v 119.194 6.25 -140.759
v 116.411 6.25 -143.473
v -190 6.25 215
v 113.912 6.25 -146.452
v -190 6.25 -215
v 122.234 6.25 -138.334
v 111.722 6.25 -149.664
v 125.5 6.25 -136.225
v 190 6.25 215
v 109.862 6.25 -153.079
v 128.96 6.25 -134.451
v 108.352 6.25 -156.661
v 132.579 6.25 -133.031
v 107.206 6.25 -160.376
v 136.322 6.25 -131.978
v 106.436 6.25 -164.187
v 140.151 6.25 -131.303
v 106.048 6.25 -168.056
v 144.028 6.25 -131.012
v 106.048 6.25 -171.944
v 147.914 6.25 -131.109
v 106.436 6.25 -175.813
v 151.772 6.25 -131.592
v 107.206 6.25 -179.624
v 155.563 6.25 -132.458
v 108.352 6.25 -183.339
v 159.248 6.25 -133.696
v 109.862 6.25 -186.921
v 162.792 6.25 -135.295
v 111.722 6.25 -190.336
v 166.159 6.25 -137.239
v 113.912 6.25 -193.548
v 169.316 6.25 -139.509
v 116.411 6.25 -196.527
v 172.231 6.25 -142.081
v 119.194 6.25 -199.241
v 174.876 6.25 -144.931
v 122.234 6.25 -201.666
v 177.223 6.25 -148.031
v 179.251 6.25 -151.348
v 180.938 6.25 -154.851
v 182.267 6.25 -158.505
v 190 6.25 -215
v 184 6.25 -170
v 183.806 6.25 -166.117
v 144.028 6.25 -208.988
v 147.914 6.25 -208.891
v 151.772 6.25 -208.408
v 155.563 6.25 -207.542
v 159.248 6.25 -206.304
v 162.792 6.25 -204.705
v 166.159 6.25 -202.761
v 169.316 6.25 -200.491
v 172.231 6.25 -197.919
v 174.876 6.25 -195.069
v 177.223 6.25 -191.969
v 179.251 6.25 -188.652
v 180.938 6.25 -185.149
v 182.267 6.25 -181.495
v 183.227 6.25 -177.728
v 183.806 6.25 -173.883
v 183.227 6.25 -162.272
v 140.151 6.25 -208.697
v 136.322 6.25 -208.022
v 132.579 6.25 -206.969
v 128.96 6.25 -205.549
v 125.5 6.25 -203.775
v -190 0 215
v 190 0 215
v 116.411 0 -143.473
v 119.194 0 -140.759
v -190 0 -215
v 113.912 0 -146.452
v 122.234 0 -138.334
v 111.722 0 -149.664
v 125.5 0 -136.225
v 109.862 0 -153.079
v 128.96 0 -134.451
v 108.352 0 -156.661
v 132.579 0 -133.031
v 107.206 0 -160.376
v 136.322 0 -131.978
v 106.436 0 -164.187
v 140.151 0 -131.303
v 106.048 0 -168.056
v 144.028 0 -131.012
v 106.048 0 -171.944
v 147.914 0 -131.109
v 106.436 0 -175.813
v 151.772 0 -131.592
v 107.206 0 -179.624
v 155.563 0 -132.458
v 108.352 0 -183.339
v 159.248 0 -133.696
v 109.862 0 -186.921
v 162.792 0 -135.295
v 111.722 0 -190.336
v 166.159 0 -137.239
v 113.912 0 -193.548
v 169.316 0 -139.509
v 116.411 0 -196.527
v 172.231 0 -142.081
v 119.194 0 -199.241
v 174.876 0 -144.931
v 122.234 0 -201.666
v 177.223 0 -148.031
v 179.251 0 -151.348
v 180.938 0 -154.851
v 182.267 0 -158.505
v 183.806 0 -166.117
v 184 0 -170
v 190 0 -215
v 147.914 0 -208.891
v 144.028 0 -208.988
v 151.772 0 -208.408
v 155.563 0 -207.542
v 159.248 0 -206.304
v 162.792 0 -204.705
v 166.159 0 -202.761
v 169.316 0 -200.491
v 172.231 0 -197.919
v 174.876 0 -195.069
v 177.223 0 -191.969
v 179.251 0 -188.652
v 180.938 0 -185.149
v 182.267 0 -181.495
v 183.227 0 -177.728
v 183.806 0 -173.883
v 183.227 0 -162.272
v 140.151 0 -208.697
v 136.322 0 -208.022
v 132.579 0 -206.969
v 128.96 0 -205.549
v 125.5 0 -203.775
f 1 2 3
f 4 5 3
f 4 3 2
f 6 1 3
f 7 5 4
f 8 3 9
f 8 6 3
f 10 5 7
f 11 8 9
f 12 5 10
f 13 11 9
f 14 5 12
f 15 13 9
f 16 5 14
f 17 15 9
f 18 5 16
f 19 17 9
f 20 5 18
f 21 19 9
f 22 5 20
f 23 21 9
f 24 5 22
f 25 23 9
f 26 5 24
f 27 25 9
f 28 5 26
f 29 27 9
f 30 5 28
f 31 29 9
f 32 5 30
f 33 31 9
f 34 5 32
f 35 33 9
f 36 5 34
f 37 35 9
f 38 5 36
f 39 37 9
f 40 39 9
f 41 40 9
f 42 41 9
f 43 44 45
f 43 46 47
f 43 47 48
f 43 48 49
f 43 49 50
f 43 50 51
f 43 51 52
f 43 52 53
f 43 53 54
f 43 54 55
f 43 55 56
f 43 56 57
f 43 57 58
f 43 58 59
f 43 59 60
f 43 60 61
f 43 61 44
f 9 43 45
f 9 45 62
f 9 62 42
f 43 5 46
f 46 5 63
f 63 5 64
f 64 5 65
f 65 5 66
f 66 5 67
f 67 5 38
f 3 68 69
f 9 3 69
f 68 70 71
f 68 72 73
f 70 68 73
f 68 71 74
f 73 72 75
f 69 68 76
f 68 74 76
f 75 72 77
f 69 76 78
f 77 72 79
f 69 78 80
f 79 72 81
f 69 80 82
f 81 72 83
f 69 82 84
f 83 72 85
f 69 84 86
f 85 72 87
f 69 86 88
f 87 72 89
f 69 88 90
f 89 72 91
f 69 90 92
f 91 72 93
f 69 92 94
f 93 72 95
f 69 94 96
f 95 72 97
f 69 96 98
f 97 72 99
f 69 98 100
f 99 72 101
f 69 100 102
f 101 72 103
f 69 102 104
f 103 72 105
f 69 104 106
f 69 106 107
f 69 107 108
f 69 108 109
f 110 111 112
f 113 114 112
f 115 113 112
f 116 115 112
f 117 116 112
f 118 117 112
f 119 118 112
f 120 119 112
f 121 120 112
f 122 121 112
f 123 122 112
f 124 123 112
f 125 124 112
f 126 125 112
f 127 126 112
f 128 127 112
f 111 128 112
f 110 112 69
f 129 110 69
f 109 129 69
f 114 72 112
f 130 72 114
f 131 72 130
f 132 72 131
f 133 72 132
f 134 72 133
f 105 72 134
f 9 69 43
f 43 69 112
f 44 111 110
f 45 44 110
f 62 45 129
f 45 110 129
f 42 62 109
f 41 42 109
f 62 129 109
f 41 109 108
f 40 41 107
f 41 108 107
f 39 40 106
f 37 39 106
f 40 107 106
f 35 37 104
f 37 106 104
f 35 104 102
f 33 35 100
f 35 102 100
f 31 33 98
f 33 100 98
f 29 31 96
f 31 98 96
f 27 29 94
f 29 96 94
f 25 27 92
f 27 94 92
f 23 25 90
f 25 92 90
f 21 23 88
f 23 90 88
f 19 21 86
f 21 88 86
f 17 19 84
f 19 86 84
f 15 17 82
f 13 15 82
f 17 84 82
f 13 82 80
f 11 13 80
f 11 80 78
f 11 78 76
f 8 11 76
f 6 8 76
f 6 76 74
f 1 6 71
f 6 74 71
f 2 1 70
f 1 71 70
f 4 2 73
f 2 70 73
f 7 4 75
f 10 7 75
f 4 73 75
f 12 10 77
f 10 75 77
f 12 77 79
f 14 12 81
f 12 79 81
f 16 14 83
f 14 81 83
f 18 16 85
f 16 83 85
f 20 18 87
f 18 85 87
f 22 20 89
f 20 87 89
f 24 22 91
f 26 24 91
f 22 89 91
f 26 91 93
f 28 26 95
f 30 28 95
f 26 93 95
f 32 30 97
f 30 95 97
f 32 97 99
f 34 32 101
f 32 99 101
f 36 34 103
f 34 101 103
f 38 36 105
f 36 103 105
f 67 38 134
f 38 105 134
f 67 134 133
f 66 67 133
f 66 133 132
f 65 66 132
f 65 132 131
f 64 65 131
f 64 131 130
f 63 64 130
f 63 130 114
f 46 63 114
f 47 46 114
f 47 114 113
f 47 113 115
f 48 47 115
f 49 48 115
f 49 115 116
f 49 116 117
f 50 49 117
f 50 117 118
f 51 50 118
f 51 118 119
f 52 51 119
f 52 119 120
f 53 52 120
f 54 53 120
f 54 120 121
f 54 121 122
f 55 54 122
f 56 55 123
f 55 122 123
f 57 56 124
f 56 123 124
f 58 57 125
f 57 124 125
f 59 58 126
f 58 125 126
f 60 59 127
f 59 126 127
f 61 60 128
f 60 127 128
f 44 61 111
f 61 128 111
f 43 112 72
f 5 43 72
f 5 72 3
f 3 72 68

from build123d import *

# Parameters (mm, degrees)
BOSS_EXTRUDE1_DEPTH = 6.25


with BuildPart() as part:
    # Sketch1 → Boss-Extrude1 (new body)
    with BuildSketch(Plane(origin=(0, 0, 0), x_dir=(1, 0, 0), z_dir=(0, 1, 0))):
        with BuildLine():
            Line((106, 215), (106, 170))
            ThreePointArc((106, 170), (145, 209), (184, 170))
            Line((184, 170), (184, 215))
            Line((184, 215), (106, 215))
        make_face()
        with BuildLine():
            ThreePointArc((184, 170), (145, 131), (106, 170))
            Line((106, 170), (106, 215))
            Line((106, 215), (-190, 215))
            Line((-190, 215), (-190, -215))
            Line((-190, -215), (190, -215))
            Line((190, -215), (190, 215))
            Line((190, 215), (184, 215))
            Line((184, 215), (184, 170))
        make_face()
    extrude(amount=BOSS_EXTRUDE1_DEPTH)


solid = part.part
